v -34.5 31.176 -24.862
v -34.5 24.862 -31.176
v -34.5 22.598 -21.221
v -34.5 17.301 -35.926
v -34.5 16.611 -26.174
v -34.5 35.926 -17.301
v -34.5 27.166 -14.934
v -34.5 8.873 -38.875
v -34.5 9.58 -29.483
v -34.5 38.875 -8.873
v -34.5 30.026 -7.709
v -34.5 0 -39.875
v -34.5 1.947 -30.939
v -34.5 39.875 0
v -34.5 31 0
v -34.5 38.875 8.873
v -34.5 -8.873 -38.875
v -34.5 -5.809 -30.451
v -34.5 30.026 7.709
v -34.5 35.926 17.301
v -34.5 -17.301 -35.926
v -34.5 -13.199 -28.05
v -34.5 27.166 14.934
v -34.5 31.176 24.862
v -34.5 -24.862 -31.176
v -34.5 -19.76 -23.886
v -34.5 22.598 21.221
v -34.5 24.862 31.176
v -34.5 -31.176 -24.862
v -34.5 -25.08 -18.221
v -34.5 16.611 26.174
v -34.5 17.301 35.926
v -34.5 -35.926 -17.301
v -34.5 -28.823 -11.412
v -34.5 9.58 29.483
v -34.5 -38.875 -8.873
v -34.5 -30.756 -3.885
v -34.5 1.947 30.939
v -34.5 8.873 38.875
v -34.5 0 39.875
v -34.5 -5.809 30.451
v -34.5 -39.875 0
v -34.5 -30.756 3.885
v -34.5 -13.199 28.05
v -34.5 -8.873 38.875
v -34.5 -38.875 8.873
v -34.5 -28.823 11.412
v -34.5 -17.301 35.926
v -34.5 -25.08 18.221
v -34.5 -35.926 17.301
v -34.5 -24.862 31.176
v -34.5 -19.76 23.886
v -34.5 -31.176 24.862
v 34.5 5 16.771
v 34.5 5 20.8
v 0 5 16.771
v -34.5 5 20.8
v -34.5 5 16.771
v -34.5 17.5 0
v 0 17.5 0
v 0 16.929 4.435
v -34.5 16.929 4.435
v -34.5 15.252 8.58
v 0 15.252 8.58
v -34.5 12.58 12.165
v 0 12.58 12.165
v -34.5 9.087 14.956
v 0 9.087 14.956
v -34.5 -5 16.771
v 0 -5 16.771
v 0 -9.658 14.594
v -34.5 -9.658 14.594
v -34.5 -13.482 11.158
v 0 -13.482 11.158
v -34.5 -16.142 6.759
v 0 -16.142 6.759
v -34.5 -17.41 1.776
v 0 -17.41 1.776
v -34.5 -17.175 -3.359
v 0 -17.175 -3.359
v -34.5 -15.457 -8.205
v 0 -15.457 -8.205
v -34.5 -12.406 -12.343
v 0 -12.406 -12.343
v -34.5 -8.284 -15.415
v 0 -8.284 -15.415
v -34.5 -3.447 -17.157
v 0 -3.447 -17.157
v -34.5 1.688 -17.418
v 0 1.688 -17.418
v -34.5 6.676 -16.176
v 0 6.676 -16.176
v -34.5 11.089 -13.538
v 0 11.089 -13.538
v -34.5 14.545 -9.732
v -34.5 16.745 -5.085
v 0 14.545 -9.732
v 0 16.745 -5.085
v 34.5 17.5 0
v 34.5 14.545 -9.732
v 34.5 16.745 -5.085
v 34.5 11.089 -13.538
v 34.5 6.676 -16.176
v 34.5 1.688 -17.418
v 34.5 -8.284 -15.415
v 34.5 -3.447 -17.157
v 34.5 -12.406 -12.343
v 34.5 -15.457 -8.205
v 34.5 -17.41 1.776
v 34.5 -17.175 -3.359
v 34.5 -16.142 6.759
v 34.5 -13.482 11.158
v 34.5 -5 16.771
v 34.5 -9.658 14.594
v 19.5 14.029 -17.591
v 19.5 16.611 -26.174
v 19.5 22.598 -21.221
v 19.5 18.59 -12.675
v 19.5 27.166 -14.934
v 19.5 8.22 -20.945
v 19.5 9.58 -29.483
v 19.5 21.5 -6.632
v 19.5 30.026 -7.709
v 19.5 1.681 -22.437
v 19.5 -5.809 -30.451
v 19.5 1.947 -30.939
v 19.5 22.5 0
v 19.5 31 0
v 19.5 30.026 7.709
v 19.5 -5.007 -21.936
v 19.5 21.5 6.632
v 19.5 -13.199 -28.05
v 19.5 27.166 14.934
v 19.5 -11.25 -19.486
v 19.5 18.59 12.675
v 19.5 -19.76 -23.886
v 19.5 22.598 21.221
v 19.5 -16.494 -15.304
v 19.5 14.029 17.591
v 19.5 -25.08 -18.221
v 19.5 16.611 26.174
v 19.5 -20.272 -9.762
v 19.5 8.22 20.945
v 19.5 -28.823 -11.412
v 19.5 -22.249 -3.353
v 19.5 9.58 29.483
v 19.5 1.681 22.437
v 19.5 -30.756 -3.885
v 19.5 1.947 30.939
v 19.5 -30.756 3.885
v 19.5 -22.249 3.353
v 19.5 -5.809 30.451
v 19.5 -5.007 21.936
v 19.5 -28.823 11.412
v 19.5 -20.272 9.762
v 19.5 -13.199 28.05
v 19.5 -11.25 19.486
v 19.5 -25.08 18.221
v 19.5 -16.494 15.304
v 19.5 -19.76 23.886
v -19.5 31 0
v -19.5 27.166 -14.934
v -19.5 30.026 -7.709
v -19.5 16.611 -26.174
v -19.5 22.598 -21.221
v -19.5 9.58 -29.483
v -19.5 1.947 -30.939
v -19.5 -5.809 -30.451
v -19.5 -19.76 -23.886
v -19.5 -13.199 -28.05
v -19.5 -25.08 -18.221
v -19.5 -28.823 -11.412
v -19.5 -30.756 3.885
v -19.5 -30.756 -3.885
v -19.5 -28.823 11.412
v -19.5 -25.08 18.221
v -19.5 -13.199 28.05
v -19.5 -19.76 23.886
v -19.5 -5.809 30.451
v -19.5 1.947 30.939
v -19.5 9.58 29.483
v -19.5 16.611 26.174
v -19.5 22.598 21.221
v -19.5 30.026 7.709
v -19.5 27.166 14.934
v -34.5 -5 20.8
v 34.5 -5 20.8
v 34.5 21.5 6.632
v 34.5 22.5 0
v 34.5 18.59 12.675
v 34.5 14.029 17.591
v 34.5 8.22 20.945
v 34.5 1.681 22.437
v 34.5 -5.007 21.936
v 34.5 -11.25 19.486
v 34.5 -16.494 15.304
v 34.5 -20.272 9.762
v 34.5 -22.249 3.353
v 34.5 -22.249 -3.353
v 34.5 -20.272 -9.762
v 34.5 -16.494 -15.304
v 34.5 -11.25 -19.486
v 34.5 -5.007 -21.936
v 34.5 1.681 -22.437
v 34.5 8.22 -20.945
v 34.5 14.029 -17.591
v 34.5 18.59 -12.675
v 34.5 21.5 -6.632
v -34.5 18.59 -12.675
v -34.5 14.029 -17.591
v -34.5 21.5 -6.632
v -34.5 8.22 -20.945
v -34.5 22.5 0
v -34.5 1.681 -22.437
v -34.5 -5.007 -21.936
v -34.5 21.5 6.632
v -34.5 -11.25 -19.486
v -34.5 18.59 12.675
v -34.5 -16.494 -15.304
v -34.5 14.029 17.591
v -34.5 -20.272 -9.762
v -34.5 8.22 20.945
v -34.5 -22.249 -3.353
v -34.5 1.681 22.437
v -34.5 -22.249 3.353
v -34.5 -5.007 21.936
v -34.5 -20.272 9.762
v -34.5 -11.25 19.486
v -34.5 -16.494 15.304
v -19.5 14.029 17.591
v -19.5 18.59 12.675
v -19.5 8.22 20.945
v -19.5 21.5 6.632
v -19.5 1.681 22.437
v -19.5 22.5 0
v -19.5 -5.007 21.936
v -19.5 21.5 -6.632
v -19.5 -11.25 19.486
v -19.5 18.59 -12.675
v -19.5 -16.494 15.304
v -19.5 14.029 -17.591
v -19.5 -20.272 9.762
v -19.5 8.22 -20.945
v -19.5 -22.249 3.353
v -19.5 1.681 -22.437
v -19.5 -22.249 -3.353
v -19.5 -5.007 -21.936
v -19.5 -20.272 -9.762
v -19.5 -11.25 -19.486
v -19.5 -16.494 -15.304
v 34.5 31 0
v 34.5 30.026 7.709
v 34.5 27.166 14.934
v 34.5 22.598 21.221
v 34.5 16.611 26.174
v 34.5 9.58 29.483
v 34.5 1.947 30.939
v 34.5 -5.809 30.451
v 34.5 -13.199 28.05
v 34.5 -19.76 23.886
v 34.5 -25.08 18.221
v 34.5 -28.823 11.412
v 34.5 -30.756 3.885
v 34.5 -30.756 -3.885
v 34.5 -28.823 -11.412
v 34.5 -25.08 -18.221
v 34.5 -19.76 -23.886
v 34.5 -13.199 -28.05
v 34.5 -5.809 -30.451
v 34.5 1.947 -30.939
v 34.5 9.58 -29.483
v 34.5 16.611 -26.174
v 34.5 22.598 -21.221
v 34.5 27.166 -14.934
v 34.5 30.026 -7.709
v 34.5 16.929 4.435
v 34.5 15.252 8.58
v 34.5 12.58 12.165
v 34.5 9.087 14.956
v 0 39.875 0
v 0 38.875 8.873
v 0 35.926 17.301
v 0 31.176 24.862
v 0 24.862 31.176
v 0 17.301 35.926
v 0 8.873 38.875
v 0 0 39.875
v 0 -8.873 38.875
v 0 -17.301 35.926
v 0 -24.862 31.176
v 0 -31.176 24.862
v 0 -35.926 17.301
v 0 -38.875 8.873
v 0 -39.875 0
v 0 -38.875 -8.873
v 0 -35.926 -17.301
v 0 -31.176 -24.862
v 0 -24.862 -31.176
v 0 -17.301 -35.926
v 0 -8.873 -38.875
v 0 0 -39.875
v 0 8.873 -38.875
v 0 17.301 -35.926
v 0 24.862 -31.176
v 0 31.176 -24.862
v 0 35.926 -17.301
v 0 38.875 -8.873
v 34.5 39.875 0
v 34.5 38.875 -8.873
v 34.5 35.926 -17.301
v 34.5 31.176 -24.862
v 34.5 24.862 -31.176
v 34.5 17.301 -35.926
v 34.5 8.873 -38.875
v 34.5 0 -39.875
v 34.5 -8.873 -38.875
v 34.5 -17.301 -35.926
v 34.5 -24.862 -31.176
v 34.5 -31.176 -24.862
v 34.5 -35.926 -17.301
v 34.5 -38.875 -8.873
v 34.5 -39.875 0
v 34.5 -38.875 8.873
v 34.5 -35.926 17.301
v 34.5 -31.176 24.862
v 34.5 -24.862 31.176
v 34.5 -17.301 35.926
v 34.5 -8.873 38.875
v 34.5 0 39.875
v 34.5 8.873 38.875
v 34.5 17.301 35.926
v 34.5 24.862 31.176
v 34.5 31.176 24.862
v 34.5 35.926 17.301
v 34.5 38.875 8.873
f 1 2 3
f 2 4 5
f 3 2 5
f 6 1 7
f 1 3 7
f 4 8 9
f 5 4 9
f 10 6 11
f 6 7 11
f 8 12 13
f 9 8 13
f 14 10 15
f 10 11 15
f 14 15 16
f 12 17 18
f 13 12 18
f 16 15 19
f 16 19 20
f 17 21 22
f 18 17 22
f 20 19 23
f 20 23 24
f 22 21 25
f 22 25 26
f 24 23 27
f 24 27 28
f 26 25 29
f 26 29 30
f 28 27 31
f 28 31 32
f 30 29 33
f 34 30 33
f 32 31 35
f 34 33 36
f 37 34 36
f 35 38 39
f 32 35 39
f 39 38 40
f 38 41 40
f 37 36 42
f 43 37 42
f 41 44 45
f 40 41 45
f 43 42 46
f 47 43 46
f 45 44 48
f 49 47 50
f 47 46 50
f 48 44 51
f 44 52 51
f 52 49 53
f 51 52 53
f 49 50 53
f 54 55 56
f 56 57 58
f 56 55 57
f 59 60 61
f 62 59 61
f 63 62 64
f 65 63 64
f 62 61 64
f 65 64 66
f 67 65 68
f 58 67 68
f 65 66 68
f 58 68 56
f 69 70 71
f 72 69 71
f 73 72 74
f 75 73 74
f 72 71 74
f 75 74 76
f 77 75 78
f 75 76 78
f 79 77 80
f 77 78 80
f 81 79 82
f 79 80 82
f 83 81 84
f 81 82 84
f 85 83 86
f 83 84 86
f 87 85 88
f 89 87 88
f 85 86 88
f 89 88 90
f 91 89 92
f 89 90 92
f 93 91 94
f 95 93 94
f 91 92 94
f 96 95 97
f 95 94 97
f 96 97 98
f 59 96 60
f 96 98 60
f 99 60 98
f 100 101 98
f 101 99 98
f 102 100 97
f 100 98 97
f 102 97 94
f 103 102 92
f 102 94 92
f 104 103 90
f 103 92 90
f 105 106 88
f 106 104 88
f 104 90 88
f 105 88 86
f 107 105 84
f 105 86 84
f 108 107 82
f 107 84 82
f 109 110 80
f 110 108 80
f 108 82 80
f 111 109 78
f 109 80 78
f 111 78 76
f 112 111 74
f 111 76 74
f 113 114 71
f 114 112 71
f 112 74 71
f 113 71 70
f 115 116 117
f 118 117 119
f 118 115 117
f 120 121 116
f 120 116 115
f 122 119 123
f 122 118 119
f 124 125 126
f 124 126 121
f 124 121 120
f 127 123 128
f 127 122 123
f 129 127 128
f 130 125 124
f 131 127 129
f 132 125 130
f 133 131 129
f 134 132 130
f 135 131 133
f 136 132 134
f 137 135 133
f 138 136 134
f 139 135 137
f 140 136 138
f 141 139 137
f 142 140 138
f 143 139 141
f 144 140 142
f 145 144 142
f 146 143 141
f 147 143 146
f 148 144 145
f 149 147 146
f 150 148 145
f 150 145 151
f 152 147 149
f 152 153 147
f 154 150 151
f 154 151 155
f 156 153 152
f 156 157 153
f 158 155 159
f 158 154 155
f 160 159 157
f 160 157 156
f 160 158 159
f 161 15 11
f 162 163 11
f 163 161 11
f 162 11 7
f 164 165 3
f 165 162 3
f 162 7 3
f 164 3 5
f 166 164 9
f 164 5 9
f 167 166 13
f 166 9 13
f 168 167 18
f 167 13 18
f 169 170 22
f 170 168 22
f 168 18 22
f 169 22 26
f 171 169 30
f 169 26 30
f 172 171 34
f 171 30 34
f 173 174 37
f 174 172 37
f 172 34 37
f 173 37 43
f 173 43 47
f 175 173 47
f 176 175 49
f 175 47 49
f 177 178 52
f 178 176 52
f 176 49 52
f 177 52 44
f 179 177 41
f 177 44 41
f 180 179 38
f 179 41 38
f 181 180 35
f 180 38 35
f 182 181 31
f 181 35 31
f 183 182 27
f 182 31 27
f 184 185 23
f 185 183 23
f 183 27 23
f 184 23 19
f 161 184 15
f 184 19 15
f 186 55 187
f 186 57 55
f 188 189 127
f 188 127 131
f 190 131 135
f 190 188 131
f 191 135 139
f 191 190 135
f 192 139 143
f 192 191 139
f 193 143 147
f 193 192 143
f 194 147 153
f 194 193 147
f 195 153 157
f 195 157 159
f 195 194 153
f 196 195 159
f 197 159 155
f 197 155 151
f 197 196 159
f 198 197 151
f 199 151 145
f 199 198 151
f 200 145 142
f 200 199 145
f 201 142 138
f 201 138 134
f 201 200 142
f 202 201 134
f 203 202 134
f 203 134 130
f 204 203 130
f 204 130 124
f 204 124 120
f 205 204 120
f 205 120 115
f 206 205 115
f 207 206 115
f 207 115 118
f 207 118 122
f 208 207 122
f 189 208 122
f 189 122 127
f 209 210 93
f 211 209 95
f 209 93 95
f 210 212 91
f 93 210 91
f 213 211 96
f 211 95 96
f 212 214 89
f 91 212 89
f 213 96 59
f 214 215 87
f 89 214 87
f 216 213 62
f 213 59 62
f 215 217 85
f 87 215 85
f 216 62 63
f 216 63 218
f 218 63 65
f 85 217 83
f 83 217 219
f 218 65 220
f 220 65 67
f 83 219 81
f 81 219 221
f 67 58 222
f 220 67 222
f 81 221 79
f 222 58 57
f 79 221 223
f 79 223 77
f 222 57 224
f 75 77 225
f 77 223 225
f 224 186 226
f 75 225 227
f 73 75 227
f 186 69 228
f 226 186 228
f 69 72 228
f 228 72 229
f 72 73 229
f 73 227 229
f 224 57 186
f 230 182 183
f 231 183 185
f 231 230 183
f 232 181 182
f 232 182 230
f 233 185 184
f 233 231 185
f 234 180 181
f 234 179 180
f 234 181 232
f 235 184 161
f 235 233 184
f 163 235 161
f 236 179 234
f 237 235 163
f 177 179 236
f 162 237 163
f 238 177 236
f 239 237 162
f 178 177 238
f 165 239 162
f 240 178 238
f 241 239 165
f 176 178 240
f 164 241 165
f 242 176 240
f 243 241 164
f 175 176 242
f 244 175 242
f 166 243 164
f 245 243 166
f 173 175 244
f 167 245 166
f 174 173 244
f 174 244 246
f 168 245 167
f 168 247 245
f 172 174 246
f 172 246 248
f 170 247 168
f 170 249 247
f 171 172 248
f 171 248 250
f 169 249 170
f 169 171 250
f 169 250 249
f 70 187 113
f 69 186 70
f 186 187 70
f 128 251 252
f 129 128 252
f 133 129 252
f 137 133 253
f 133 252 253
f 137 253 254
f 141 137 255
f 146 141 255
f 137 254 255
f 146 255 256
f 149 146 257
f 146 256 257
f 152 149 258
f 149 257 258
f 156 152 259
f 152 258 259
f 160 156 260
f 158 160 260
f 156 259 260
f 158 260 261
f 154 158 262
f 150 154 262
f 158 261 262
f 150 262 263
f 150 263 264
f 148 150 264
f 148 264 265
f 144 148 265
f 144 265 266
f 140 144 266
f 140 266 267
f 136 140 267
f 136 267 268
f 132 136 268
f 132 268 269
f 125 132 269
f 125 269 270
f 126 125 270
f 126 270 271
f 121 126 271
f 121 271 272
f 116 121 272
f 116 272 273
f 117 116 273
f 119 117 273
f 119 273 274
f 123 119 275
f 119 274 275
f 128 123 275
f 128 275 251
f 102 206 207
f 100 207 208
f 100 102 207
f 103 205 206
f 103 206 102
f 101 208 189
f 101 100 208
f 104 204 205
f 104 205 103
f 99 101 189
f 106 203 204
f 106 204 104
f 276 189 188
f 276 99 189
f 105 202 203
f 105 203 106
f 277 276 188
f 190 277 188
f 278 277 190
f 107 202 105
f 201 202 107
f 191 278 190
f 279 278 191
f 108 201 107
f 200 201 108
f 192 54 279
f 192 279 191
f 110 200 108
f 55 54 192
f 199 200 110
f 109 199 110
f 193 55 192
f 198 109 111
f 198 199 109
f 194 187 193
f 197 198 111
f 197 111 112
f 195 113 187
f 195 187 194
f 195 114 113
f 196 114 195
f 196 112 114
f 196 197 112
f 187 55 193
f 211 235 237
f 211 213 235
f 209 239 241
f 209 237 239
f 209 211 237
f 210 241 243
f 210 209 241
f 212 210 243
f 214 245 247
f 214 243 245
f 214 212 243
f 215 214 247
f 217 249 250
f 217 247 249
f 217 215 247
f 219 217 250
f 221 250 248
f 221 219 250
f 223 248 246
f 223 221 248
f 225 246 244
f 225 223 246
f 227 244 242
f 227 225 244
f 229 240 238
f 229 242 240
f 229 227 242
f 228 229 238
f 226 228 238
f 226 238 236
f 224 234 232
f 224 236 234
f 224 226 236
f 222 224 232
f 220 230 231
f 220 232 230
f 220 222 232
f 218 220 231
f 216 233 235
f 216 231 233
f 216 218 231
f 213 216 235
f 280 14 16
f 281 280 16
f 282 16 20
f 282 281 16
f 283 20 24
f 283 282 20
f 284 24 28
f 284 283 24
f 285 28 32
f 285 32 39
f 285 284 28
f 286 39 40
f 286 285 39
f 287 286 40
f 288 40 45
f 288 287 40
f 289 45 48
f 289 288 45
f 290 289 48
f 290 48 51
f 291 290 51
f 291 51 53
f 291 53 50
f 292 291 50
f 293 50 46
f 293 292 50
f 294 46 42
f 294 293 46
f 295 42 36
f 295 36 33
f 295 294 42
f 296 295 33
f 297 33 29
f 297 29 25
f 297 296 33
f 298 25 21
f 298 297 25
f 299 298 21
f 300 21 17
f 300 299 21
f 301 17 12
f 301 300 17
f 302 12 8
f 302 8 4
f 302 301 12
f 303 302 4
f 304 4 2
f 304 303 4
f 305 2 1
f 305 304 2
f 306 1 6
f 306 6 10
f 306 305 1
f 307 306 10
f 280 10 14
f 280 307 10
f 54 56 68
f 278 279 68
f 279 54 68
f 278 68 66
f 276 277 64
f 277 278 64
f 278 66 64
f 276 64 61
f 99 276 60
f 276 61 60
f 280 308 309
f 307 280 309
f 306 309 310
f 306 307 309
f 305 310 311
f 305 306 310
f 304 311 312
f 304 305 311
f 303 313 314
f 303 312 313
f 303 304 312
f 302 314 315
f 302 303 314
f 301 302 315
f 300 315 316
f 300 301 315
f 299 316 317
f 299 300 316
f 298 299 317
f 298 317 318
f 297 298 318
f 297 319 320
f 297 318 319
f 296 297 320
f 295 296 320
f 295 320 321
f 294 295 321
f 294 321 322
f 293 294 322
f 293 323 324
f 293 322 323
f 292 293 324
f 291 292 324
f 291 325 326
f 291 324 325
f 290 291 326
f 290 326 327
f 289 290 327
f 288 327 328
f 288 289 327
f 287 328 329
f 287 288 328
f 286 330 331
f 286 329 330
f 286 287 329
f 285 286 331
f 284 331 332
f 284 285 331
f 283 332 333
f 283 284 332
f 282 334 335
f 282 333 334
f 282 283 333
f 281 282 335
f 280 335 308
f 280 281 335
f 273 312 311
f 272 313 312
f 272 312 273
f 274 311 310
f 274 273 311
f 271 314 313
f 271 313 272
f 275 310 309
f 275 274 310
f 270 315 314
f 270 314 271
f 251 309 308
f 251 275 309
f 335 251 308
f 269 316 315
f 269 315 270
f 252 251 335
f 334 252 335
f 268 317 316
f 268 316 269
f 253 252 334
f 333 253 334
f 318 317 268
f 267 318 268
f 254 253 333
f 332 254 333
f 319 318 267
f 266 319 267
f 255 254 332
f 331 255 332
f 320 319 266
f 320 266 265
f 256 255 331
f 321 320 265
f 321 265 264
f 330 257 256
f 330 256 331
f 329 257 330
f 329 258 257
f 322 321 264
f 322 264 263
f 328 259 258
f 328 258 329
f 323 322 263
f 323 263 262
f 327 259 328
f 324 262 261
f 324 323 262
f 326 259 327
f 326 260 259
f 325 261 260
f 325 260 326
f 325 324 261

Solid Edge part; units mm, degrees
sketch "Sketch1" plane through (0, 0, 0) normal (1, 0, 0) x (0, 1, 0)
  circle A0 centre (0, 0) radius 17.5
  circle A1 centre (0, 0) radius 39.875
extrude "Protrusion1" add sketch "Sketch1" along normal mid plane 69
sketch "Sketch2" plane through (34.5, 0, 0) normal (1, 0, 0) x (0, 1, 0)
  circle A0 centre (0, 0) radius 22.5
  circle A1 centre (0, 0) radius 31
extrude "VaciadoExtruido_3" cut sketch "Sketch2" against normal blind 15
mirror "Mirror1" about plane through (0, 0, 0) normal (1, 0, 0) of "VaciadoExtruido_3"
sketch "Sketch3" plane through (34.5, 0, 0) normal (1, 0, 0) x (0, 1, 0)
  line L0 (0, 20.8) -> (-5, 20.8)
  line L1 (-5, 20.8) -> (-5, 16.7705)
  line L2 (5, 20.8) -> (5, 16.7705)
  line L3 (0, 20.8) -> (5, 20.8)
  arc A0 (-5, 16.7705) -> (5, 16.7705) centre (0, 0) cw
extrude "VaciadoExtruido_5" cut sketch "Sketch3" along normal mid plane 188
properties material "Acero"
